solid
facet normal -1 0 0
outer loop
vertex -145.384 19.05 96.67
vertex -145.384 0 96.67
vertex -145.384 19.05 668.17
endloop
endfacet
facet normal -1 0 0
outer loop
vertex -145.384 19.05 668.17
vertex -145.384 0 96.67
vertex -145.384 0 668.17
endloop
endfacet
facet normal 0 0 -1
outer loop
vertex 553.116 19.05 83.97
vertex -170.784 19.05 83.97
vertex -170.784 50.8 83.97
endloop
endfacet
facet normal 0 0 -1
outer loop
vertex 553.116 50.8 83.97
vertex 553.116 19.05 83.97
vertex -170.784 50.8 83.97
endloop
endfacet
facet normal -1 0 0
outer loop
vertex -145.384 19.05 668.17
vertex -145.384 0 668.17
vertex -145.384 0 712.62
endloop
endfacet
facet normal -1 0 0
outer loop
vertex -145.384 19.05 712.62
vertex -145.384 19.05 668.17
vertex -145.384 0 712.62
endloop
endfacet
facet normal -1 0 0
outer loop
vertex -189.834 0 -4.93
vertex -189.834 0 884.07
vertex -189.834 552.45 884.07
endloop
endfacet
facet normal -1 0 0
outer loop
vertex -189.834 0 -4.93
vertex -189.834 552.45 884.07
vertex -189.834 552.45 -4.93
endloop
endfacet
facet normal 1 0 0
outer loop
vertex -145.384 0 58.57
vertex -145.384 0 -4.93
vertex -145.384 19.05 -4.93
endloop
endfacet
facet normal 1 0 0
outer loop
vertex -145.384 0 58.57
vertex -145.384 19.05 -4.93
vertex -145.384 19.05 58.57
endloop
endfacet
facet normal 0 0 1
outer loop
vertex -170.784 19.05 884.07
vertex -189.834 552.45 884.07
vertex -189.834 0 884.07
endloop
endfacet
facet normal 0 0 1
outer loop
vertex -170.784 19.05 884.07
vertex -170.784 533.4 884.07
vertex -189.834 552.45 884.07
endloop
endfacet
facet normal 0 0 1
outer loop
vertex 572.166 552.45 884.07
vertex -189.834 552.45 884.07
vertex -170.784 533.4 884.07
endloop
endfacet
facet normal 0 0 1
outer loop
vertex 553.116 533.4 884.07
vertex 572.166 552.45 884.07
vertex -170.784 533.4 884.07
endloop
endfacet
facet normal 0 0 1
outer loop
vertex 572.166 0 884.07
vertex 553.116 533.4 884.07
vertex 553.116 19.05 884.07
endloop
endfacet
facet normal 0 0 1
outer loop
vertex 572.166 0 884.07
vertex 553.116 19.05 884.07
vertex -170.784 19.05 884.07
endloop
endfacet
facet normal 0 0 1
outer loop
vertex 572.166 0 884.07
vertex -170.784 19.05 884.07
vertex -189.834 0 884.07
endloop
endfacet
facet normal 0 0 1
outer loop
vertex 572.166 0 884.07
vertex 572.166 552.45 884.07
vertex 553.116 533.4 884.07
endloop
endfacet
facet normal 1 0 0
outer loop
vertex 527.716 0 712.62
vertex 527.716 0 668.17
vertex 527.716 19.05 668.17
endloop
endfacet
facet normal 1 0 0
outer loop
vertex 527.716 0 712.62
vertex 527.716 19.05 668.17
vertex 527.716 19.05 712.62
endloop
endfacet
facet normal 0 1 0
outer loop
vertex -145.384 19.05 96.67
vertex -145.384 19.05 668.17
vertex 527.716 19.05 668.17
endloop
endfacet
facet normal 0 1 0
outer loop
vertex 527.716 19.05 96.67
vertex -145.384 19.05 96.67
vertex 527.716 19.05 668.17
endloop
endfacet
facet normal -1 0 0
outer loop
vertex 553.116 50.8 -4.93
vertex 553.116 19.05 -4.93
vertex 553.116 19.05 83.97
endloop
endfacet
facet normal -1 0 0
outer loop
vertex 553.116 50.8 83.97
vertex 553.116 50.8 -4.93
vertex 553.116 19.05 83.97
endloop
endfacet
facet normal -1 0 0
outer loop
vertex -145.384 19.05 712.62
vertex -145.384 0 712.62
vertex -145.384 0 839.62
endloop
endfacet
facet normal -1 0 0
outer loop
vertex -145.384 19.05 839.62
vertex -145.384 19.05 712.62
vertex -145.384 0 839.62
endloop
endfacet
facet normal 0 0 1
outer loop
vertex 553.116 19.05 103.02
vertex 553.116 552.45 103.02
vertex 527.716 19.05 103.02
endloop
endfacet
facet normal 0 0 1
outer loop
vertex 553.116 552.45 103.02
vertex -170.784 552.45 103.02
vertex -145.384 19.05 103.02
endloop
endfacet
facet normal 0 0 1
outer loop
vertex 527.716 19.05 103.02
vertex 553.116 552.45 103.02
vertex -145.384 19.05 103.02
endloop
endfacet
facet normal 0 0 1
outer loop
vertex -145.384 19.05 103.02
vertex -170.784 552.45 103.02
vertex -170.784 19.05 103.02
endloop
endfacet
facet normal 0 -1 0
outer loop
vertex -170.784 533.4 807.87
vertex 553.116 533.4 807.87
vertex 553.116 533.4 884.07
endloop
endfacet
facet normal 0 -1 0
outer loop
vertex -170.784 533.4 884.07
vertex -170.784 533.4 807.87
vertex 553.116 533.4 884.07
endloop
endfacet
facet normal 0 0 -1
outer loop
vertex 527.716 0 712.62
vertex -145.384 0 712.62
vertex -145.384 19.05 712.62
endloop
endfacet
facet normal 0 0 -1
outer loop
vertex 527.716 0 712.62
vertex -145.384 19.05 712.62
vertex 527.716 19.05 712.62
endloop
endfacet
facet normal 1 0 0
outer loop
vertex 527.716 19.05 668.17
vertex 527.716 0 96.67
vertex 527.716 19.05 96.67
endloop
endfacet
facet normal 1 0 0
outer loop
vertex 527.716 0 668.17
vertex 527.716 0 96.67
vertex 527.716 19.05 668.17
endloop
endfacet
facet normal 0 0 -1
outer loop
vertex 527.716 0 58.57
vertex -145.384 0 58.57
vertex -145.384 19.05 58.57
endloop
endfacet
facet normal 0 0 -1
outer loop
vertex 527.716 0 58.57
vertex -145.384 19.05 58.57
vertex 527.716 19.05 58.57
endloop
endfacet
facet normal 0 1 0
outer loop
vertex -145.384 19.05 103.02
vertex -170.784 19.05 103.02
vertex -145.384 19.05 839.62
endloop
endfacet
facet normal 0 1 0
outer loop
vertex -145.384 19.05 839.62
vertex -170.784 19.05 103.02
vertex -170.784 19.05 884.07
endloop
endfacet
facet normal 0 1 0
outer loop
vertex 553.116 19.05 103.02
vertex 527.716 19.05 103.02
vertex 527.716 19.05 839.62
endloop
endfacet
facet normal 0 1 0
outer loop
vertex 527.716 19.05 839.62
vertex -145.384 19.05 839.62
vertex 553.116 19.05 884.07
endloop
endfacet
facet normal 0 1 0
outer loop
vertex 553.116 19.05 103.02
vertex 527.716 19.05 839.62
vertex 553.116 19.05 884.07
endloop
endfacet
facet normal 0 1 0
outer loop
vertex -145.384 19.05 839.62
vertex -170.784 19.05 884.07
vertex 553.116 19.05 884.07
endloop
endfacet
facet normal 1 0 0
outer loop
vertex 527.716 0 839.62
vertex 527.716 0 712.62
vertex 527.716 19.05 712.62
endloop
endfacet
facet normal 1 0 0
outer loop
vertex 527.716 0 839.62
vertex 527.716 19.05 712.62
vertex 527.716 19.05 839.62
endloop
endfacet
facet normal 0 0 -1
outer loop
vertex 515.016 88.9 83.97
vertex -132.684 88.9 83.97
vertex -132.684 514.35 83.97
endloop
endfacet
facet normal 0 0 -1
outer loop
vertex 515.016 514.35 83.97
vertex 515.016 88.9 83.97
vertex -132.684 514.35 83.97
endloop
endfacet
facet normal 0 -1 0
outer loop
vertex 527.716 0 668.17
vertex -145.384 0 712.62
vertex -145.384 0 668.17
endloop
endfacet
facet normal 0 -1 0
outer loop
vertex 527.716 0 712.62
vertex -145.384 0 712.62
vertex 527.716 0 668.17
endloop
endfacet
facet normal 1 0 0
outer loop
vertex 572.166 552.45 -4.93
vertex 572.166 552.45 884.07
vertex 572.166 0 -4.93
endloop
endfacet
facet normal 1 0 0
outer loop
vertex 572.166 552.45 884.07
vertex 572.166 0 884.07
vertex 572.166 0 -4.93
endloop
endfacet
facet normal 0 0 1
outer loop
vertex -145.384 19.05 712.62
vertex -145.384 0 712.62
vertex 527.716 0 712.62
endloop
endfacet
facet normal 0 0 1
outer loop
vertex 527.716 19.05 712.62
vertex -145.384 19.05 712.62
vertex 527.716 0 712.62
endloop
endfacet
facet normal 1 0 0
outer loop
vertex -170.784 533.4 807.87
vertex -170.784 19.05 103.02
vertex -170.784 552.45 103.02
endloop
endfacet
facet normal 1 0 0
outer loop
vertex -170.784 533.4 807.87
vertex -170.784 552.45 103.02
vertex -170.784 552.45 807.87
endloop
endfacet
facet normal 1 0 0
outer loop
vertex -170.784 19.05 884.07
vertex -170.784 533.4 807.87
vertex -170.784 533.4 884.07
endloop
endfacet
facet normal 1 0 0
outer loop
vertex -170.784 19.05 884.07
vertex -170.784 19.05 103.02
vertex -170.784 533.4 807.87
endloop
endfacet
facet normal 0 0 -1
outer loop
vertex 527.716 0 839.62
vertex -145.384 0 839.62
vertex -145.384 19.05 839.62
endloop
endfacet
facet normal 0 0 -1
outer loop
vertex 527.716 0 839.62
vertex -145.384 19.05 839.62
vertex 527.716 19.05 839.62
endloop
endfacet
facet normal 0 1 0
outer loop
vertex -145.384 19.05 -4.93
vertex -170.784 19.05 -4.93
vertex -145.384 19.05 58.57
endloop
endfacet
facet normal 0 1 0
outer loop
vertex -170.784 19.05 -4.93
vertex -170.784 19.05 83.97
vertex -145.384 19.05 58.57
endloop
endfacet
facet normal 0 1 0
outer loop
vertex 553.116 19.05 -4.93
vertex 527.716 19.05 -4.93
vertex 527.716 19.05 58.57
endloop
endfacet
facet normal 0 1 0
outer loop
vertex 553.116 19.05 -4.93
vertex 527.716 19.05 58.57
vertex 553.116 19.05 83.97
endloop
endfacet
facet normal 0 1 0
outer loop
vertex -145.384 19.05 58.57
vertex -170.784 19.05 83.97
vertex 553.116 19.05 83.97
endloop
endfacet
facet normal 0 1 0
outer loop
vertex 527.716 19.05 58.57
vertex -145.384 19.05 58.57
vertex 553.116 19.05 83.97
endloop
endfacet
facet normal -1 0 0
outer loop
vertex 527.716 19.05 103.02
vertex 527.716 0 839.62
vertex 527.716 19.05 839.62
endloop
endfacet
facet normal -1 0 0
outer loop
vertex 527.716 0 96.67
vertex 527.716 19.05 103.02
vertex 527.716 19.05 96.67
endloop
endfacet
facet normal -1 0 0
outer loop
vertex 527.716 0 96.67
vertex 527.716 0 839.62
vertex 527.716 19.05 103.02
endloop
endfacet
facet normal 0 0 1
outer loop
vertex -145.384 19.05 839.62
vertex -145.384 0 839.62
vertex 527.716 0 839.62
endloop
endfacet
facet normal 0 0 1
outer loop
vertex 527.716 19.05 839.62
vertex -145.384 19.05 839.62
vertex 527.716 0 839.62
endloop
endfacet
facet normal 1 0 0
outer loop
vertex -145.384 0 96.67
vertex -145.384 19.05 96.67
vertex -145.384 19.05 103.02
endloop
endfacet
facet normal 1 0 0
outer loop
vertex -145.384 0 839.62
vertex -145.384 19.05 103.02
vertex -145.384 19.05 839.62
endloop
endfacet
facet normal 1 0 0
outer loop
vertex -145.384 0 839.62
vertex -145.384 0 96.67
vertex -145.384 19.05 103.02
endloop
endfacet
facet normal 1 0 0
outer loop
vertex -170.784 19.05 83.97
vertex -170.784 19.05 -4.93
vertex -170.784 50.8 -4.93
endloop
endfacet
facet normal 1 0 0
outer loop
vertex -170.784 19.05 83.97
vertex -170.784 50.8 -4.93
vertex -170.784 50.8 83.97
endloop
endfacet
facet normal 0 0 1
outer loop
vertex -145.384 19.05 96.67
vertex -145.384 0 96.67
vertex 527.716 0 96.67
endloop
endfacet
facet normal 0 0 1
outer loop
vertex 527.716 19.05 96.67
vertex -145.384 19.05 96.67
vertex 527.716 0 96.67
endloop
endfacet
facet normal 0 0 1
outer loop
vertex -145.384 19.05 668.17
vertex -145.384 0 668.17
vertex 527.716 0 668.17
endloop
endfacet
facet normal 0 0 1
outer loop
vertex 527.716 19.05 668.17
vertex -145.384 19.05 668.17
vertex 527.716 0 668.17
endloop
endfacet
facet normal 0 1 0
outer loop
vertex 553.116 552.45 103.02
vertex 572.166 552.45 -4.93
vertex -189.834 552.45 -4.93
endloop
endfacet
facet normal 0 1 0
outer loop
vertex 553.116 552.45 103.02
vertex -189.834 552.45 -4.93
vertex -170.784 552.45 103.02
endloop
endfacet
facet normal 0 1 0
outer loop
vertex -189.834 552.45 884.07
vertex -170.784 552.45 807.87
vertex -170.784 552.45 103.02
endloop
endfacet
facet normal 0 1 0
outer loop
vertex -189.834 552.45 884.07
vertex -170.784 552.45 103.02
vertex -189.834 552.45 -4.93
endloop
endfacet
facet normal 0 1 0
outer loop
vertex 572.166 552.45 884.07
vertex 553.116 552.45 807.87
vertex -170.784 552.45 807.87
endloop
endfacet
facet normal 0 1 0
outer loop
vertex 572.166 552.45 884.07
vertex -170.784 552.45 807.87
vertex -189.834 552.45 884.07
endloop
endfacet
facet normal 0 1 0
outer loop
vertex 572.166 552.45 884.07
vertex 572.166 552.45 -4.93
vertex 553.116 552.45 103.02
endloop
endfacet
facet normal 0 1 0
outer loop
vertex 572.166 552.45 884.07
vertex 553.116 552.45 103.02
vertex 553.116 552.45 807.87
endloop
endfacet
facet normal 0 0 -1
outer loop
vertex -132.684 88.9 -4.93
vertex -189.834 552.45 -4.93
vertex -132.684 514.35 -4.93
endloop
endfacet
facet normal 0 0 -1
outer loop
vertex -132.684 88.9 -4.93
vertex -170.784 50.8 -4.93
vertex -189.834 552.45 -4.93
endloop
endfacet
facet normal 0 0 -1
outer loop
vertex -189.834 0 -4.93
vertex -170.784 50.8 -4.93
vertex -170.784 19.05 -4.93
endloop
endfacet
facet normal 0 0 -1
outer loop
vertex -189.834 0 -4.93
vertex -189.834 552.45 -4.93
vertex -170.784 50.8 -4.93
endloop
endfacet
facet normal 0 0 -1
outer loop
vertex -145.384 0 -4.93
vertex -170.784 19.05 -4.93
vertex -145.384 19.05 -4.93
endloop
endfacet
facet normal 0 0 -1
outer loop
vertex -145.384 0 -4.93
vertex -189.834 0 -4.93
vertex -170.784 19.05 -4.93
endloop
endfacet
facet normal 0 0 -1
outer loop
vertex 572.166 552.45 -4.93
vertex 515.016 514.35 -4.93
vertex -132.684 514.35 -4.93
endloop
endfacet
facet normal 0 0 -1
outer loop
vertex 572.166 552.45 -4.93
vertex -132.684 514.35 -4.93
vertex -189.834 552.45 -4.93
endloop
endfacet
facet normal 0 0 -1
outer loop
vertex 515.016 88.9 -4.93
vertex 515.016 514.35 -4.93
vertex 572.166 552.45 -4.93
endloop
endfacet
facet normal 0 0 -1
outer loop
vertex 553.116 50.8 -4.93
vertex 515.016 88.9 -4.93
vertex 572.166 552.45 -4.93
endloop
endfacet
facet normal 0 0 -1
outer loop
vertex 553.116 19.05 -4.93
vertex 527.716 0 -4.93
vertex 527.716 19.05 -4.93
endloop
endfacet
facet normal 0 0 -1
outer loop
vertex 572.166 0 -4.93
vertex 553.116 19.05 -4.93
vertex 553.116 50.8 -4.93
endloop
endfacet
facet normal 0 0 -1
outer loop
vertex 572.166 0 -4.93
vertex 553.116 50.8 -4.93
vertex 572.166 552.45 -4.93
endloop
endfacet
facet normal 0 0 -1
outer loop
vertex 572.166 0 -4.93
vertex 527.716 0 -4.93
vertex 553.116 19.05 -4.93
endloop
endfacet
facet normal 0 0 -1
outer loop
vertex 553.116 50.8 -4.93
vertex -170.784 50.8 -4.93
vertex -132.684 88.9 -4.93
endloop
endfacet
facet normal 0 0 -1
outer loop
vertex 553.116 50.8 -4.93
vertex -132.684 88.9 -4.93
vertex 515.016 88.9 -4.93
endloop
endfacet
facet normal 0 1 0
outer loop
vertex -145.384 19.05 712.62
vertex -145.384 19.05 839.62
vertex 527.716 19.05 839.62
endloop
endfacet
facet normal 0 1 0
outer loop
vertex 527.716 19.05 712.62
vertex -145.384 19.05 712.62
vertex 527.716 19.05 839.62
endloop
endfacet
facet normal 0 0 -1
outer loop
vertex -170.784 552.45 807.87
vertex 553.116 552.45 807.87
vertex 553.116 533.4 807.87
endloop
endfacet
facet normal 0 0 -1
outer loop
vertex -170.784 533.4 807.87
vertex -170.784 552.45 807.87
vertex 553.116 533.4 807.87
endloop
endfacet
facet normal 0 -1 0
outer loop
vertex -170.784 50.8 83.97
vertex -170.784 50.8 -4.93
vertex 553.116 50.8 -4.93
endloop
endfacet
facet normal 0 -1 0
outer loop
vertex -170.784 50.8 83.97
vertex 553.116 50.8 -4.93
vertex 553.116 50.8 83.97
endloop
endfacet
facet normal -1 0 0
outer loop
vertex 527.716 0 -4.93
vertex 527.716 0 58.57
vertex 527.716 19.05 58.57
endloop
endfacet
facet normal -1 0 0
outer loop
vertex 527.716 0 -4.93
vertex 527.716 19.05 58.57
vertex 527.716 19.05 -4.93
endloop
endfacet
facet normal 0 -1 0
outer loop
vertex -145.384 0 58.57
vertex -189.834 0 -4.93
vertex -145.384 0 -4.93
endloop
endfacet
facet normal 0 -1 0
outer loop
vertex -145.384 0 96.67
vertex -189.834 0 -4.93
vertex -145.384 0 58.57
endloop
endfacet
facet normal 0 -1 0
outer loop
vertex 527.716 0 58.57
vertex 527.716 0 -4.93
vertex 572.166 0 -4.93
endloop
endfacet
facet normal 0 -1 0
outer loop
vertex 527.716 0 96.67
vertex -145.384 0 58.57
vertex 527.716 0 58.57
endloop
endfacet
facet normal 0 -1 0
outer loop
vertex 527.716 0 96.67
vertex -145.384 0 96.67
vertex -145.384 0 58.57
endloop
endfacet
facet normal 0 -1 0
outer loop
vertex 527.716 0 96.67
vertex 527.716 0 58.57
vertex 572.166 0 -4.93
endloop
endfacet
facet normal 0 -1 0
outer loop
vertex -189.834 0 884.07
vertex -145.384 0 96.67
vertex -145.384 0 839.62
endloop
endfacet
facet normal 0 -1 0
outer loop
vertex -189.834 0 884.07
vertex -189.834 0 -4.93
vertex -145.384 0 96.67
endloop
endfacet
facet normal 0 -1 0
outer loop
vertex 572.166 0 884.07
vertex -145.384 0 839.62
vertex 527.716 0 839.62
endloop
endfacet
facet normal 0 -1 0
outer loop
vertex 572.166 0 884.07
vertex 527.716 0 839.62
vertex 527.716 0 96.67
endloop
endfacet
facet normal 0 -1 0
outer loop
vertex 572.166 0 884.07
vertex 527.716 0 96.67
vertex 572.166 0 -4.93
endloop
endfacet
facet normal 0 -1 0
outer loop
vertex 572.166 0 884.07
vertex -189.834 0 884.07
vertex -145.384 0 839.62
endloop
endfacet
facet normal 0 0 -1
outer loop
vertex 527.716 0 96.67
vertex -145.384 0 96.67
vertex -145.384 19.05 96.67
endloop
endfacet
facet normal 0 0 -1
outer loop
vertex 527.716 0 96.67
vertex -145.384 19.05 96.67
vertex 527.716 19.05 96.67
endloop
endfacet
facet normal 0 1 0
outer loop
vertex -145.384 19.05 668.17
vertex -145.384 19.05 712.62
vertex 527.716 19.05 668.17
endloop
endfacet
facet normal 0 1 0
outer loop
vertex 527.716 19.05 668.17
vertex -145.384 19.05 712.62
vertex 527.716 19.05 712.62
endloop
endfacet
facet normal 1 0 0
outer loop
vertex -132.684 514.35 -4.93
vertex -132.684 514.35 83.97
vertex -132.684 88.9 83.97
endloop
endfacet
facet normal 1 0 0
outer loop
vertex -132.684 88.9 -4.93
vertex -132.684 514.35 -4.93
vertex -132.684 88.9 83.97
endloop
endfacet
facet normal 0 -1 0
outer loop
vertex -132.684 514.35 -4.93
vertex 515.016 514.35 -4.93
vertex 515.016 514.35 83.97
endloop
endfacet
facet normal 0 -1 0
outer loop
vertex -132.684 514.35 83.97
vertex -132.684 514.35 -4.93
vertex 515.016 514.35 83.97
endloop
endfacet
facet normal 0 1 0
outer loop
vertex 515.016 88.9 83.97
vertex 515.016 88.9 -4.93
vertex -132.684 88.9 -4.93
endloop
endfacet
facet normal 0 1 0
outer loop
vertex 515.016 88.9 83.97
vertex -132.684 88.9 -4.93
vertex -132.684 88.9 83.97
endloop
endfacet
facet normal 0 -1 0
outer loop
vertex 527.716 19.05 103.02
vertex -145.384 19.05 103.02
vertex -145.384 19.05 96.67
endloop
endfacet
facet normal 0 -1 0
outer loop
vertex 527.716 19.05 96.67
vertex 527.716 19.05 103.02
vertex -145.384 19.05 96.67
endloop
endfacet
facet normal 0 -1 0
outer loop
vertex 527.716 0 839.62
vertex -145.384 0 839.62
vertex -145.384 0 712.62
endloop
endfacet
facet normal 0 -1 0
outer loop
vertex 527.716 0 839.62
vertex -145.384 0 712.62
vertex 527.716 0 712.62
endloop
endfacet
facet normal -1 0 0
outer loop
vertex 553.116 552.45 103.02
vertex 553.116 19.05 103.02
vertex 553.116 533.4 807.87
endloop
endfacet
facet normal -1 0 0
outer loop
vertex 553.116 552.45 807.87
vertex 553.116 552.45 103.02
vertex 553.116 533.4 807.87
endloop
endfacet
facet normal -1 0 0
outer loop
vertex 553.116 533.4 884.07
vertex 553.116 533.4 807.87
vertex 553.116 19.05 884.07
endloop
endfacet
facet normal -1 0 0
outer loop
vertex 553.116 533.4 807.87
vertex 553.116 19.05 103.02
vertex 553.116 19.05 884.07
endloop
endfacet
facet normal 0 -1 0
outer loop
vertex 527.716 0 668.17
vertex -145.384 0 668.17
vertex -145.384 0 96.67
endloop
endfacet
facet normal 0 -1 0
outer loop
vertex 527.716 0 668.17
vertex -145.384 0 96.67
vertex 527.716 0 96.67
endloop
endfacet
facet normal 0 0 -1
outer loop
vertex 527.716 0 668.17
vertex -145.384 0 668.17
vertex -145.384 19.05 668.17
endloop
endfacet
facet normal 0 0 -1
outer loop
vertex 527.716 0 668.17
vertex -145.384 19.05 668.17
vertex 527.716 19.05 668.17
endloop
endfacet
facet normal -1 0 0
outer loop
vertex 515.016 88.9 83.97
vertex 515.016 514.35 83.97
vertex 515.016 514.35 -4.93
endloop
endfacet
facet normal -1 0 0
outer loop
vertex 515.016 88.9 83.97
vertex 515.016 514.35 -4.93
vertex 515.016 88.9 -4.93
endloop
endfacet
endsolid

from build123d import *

# Parameters (mm, degrees)
F0_W      = 673.1
F0_H      = 38.1
F0_H_2    = 44.45
F1_DEPTH  = 19.05
F2_W      = 19.05
F2_H      = 889
F3_DEPTH  = 533.4
F4_W      = 38.1
F4_H      = 88.9
F5_DEPTH  = 723.9
F7_DEPTH  = 723.9
F8_W      = 38.1
F8_H      = 425.45
F9_DEPTH  = 88.9
F11_W     = 19.05
F11_H     = 76.2
F12_DEPTH = 723.9
F13_DEPTH = 19.05
F0_H_3    = 127
F0_H_4    = 571.5
F14_DEPTH = 19.05


with BuildPart() as f1:
    # F0 (on Front) → F1 (new body)
    with BuildSketch(Plane.XZ):
        with Locations((191.166076, 77.620111)):
            Rectangle(F0_W, F0_H)
        Polygon((-145.383924, 884.070111), (-189.833924, 884.070111), (-189.833924, -4.929889), (-145.383924, -4.929889), (-145.383924, 58.570111), (-145.383924, 96.670111), (-145.383924, 668.170111), (-145.383924, 712.620111), (-145.383924, 839.620111), align=None)
        with Locations((191.166076, 861.845111)):
            Rectangle(F0_W, F0_H_2)
        Polygon((572.166076, 884.070111), (527.716076, 884.070111), (527.716076, 839.620111), (527.716076, 712.620111), (527.716076, 668.170111), (527.716076, 96.670111), (527.716076, 58.570111), (527.716076, -4.929889), (572.166076, -4.929889), align=None)
    extrude(amount=-F1_DEPTH)

    # F2 (on face) → F3 (join)
    with BuildSketch(Plane(origin=(0, 19.05, 0), x_dir=(-1, 0, 0), z_dir=(0, 1, 0))):
        Polygon((-553.116076, 884.070111), (-572.166076, 884.070111), (-572.166076, -4.929889), (-553.116076, -4.929889), (-553.116076, 83.970111), align=None)
        with Locations((180.308924, 439.570111)):
            Rectangle(F2_W, F2_H)
    extrude(amount=F3_DEPTH)

    # F4 (on face) → F5 (join, through all)
    with BuildSketch(Plane(origin=(553.116076, 0, 0), x_dir=(0, -1, 0), z_dir=(-1, 0, 0))):
        with Locations((-533.4, 39.520111)):
            Rectangle(F4_W, F4_H)
        with Locations((-69.85, 39.520111)):
            Rectangle(F4_W, F4_H)
    extrude(amount=F5_DEPTH)

    # F6 (on face) → F7 (join, through all)
    with BuildSketch(Plane.YZ.offset(-170.783924)):
        Polygon((552.45, 103.020111), (19.05, 103.020111), (19.05, 83.970111), (50.8, 83.970111), (88.9, 83.970111), (514.35, 83.970111), (552.45, 83.970111), align=None)
    extrude(amount=F7_DEPTH)

    # F8 (on face) → F9 (join)
    with BuildSketch(Plane(origin=(0, 0, 83.970111), x_dir=(1, 0, 0), z_dir=(0, 0, -1))):
        with Locations((-151.733924, -301.625)):
            Rectangle(F8_W, F8_H)
        with Locations((534.066076, -301.625)):
            Rectangle(F8_W, F8_H)
    extrude(amount=F9_DEPTH)

    # F11 (on face) → F12 (join, through all)
    with BuildSketch(Plane(origin=(553.116076, 0, 0), x_dir=(0, -1, 0), z_dir=(-1, 0, 0))):
        with Locations((-542.925, 845.970111)):
            Rectangle(F11_W, F11_H)
    extrude(amount=F12_DEPTH)


with BuildPart() as f13:
    # F0 (on Front) → F13 (new body)
    with BuildSketch(Plane.XZ):
        with Locations((191.166076, 690.395111)):
            Rectangle(F0_W, F0_H_2)
    extrude(amount=-F13_DEPTH)


with BuildPart() as f14:
    # F0 (on Front) → F14 (new body)
    with BuildSketch(Plane.XZ):
        with Locations((191.166076, 776.120111)):
            Rectangle(F0_W, F0_H_3)
        with Locations((191.166076, 382.420111)):
            Rectangle(F0_W, F0_H_4)
    extrude(amount=-F14_DEPTH)


solid = Compound([f1.part, f13.part, f14.part])
